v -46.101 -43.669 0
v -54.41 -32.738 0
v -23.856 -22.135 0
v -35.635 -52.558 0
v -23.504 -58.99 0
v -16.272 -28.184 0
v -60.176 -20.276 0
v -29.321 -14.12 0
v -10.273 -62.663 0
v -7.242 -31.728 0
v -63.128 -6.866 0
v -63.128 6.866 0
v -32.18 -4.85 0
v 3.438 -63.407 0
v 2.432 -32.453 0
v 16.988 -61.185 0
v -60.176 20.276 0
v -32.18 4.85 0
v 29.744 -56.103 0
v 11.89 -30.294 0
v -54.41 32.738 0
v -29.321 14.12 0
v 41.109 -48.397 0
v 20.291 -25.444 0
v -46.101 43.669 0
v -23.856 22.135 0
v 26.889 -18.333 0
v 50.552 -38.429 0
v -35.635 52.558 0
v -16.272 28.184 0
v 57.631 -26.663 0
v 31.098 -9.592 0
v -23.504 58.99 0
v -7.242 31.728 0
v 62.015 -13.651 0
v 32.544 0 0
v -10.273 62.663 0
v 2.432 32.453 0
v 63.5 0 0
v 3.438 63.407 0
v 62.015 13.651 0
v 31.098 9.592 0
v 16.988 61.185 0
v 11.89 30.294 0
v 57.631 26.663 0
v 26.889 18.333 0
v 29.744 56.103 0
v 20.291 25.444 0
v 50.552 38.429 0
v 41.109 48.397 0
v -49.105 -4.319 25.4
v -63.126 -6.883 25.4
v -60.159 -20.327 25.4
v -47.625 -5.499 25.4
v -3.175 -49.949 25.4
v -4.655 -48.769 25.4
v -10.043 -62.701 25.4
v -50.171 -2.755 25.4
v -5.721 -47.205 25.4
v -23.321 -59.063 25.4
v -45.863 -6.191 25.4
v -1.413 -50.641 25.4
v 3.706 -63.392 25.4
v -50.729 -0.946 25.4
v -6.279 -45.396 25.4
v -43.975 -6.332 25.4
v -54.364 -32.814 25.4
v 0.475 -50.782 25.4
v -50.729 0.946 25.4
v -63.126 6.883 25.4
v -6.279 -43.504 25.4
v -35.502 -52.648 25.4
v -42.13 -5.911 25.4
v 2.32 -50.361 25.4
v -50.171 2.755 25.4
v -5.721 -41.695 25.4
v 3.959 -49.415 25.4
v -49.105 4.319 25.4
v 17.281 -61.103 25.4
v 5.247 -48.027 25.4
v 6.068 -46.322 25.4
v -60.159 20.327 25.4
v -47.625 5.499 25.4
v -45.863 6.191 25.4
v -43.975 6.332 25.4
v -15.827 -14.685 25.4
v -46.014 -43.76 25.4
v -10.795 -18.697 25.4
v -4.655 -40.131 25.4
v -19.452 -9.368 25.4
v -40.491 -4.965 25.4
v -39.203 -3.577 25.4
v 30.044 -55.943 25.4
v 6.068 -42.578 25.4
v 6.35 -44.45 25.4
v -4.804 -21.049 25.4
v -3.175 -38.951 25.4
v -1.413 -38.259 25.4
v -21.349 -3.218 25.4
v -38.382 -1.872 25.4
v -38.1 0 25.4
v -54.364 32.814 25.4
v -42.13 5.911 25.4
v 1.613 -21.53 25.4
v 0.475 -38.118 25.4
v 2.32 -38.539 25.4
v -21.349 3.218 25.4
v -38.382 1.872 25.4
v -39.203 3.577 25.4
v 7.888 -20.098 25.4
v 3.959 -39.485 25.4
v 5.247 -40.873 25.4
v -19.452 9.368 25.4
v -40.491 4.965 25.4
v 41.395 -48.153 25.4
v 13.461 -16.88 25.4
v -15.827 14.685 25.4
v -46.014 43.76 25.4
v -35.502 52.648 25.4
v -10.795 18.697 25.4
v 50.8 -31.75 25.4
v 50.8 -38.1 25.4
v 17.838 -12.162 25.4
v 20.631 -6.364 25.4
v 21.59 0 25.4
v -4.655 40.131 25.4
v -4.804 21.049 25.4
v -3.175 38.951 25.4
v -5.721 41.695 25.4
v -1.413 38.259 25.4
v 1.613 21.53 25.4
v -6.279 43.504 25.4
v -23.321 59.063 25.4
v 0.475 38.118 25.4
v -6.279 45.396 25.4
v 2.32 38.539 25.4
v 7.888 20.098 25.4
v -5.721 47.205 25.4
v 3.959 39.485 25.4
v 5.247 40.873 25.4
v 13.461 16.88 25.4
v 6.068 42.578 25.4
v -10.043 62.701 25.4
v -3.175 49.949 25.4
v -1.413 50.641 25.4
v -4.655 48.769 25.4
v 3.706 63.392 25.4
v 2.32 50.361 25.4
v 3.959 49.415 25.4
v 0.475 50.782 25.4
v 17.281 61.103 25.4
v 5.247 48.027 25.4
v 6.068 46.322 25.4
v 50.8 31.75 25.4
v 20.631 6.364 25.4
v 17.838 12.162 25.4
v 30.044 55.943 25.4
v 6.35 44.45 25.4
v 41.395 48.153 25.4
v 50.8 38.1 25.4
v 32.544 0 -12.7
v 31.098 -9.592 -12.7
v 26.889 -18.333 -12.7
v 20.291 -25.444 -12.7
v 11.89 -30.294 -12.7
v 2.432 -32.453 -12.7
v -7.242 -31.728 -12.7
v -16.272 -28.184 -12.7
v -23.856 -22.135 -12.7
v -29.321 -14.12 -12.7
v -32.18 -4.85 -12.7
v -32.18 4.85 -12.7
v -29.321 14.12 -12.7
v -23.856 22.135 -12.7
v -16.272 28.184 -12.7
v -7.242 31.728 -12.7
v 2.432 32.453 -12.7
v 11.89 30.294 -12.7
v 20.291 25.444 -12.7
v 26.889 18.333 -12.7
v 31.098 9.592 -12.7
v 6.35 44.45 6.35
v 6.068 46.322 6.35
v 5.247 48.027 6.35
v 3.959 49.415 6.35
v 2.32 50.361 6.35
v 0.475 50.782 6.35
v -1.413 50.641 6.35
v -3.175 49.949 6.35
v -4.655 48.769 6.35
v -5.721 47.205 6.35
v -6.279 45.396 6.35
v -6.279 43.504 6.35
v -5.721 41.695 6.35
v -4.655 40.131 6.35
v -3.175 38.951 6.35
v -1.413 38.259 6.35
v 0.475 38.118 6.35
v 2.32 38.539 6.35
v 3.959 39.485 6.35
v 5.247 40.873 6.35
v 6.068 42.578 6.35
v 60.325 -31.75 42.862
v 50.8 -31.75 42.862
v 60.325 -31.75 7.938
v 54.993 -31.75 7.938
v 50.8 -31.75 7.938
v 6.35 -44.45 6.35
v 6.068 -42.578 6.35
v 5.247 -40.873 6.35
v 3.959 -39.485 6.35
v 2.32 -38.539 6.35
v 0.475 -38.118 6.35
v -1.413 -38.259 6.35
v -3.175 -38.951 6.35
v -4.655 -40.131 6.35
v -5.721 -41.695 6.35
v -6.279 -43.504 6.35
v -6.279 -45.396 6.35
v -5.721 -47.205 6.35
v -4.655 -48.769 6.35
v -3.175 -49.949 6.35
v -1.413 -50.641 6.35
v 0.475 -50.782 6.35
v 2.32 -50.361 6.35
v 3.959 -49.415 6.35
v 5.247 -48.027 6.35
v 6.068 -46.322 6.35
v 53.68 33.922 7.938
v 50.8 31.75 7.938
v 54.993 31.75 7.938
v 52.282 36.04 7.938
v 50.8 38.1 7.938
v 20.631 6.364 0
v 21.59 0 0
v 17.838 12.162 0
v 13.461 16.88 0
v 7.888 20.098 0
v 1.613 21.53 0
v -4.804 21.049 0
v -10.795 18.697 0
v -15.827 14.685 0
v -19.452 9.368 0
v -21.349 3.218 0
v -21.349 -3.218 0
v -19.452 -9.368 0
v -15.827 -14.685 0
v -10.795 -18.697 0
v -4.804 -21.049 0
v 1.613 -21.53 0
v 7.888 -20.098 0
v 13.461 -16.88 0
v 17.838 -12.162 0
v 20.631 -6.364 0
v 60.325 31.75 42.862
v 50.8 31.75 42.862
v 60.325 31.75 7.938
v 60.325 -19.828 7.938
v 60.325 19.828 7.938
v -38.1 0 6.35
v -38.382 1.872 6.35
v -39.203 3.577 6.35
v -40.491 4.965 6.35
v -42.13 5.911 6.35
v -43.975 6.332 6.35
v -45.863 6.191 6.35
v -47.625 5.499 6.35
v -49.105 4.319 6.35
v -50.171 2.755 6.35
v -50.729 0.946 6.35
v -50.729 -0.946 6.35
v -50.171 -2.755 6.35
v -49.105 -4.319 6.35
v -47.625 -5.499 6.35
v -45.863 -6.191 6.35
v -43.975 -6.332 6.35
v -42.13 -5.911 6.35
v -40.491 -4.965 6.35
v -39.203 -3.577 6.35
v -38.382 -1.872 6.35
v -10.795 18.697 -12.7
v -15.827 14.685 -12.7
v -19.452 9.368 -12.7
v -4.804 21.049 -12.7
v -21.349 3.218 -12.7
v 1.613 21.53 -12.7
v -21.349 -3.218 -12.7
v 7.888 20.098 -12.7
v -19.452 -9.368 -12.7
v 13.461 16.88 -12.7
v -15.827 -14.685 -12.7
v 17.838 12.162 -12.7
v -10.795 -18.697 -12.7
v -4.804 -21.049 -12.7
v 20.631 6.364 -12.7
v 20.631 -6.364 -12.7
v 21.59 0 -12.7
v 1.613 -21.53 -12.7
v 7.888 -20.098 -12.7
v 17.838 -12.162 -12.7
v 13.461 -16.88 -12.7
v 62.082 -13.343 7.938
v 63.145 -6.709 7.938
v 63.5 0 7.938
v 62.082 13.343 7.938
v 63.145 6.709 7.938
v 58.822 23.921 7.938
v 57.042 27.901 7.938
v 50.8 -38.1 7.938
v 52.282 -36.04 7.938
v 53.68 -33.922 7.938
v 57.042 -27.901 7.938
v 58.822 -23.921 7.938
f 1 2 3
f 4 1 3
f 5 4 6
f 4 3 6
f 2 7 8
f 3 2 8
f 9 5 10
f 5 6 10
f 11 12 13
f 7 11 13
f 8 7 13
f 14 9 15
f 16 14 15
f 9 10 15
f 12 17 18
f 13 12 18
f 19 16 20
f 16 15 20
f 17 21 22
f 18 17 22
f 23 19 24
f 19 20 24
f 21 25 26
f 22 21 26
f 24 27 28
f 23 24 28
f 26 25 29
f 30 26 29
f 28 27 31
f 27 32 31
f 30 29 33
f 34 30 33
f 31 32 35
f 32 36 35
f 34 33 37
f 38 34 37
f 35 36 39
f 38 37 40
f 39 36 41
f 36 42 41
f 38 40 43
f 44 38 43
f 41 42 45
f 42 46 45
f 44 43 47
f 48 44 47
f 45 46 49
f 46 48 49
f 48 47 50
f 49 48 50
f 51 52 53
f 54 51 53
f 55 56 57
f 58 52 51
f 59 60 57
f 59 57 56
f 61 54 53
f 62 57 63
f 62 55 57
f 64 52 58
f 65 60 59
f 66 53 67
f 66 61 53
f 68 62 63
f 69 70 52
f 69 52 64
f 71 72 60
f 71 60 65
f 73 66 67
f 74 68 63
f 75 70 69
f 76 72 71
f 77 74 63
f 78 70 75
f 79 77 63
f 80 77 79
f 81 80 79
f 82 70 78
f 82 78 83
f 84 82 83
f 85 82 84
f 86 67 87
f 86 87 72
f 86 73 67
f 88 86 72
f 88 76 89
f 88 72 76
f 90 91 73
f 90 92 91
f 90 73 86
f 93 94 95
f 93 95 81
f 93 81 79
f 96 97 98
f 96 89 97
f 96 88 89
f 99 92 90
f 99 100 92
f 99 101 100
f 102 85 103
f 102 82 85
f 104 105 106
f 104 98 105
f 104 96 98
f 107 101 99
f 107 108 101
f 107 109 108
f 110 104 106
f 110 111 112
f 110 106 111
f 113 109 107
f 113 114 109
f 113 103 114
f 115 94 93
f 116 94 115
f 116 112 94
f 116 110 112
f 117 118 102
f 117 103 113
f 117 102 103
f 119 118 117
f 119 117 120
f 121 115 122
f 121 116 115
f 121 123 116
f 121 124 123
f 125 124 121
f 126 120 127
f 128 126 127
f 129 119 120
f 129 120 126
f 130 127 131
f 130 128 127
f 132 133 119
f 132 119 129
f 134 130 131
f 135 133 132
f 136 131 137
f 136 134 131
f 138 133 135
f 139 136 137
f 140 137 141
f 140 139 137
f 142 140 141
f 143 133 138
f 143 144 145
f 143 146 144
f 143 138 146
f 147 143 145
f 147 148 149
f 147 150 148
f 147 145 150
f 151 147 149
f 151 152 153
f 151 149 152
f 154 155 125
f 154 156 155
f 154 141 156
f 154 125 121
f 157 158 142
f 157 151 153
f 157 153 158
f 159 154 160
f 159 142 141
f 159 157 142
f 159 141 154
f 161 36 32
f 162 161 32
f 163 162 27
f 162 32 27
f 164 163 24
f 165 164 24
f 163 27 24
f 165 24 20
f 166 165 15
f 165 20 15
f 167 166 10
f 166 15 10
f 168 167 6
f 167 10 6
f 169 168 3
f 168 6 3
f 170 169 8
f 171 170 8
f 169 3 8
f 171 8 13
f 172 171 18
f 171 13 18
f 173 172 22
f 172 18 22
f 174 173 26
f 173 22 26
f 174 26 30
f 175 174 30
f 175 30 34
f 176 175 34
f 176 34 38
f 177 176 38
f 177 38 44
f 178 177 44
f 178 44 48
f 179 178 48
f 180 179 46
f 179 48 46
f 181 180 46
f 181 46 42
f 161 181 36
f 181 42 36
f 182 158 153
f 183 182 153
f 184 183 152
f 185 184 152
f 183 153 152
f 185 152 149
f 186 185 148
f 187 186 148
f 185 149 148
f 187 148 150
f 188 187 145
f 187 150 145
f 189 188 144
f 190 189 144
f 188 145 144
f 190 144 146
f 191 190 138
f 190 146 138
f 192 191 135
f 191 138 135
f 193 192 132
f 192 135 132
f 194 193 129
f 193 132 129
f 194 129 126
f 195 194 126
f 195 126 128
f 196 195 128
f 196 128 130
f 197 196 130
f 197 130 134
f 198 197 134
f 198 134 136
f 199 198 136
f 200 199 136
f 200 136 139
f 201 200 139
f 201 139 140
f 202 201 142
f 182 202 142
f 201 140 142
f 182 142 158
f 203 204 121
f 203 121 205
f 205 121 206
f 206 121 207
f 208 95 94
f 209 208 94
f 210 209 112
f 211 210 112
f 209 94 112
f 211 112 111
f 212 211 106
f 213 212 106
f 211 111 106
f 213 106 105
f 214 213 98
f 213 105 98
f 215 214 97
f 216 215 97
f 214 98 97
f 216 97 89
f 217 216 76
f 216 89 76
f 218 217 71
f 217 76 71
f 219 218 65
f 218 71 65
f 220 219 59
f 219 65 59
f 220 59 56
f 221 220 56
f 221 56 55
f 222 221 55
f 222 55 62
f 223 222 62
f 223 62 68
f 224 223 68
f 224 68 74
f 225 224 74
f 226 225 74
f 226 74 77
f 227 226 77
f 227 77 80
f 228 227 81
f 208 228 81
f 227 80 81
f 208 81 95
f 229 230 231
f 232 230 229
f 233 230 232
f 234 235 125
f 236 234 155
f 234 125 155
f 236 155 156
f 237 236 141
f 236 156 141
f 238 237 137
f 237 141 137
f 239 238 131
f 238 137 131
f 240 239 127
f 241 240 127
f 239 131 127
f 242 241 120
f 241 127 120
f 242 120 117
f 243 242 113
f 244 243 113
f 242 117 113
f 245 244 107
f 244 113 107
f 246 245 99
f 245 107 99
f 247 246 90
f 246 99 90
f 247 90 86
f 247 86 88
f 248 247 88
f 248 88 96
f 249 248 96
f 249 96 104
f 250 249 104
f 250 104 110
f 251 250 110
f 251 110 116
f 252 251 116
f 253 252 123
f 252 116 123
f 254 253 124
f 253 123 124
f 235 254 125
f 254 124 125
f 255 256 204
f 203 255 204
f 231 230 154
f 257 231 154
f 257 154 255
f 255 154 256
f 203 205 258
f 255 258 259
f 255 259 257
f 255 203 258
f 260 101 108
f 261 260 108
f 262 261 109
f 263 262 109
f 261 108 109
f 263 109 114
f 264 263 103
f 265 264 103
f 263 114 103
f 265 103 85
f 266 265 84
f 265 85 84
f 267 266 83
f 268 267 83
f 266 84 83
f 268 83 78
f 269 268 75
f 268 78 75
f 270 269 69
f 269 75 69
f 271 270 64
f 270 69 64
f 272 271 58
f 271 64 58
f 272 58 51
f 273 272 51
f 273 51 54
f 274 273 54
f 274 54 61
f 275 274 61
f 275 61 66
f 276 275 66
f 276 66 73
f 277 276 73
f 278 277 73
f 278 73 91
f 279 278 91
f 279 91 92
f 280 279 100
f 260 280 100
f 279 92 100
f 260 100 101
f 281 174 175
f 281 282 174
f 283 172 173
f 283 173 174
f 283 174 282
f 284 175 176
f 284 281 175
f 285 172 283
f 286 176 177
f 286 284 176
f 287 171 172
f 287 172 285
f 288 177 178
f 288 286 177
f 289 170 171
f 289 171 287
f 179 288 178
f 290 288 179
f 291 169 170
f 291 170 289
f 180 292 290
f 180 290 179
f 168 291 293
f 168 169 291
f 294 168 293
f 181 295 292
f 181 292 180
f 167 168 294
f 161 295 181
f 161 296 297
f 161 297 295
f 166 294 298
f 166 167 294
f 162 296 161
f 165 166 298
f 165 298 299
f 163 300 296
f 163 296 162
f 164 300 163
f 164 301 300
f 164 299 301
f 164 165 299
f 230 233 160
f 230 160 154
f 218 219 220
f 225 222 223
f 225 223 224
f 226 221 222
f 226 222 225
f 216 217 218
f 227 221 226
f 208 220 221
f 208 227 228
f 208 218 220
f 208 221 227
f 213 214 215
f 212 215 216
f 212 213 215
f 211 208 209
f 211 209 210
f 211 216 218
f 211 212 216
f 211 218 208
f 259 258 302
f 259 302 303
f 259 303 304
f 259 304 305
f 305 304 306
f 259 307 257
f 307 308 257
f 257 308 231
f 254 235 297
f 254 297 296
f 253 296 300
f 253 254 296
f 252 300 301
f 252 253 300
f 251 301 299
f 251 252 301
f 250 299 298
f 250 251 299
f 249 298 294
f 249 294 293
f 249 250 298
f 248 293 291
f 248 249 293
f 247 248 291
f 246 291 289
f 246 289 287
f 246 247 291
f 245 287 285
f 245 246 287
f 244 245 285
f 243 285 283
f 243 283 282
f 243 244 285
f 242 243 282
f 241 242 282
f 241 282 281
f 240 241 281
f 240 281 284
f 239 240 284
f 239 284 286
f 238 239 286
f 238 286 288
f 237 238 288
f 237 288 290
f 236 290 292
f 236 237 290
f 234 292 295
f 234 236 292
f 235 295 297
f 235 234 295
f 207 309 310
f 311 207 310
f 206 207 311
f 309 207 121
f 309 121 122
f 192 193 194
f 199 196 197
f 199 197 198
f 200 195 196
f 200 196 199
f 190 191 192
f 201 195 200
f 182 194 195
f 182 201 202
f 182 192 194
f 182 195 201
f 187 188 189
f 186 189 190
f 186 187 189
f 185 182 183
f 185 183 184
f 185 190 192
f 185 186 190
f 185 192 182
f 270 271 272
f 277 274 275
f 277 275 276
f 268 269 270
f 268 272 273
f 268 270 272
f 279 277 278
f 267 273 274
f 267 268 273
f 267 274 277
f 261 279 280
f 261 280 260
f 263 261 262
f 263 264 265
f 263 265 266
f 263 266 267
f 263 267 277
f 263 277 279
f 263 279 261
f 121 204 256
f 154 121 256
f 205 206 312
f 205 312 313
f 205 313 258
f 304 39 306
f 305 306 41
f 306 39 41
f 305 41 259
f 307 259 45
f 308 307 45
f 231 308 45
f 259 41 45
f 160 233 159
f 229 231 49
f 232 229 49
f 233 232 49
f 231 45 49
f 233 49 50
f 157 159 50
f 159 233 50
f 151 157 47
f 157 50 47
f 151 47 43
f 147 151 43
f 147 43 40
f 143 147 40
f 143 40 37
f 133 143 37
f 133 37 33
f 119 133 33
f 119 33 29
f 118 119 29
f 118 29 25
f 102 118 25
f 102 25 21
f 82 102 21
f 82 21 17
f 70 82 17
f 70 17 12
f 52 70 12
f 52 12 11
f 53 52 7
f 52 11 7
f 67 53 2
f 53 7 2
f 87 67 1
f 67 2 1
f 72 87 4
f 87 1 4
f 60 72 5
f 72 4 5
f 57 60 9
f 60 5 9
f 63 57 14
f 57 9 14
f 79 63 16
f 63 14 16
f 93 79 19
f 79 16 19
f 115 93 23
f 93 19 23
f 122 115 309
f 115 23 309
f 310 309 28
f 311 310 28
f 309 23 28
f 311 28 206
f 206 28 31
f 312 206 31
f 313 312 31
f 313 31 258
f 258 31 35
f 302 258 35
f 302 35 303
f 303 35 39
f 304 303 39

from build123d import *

# Parameters (mm, degrees)
F0_R      = 63.5
F1_DEPTH  = 25.4
F3_DEPTH  = 17.4625
F4_R      = 6.35
F5_DEPTH  = 19.05
F6_R      = 21.59
F7_DEPTH  = 25.4
F8_R      = 32.54375
F8_R_2    = 21.59
F9_DEPTH  = 12.7
F11_DEPTH = 9.525


with BuildPart() as f1:
    # F0 (on Top) → F1 (new body)
    with BuildSketch(Plane.XY):
        Circle(F0_R)
    extrude(amount=F1_DEPTH)

    # F2 (on face) → F3 (cut)
    with BuildSketch(Plane.XY.offset(25.4)):
        with BuildLine():
            ThreePointArc((50.8, -38.1), (63.5, 0), (50.8, 38.1))
            Line((50.8, 38.1), (50.8, -38.1))
        make_face()
    extrude(amount=-F3_DEPTH, mode=Mode.SUBTRACT)

    # F4 (on face) → F5 (cut)
    with BuildSketch(Plane.XY.offset(25.4)):
        with Locations((0, 44.45)):
            Circle(F4_R)
        with Locations((-44.45, 0)):
            Circle(F4_R)
        with Locations((0, -44.45)):
            Circle(F4_R)
    extrude(amount=-F5_DEPTH, mode=Mode.SUBTRACT)

    # F6 (on face) → F7 (cut, through all)
    with BuildSketch(Plane.XY.offset(25.4)):
        Circle(F6_R)
    extrude(amount=-F7_DEPTH, mode=Mode.SUBTRACT)

    # F8 (on face) → F9 (join)
    with BuildSketch(Plane(origin=(0, 0, 0), x_dir=(1, 0, 0), z_dir=(0, 0, -1))):
        Circle(F8_R)
        Circle(F8_R_2, mode=Mode.SUBTRACT)
    extrude(amount=F9_DEPTH)

    # F10 (on face) → F11 (join)
    with BuildSketch(Plane.YZ.offset(50.8)):
        Polygon((-31.75, 7.9375), (0, 7.9375), (31.75, 7.9375), (31.75, 42.8625), (0, 42.8625), (-31.75, 42.8625), align=None)
    extrude(amount=F11_DEPTH)


solid = f1.part
